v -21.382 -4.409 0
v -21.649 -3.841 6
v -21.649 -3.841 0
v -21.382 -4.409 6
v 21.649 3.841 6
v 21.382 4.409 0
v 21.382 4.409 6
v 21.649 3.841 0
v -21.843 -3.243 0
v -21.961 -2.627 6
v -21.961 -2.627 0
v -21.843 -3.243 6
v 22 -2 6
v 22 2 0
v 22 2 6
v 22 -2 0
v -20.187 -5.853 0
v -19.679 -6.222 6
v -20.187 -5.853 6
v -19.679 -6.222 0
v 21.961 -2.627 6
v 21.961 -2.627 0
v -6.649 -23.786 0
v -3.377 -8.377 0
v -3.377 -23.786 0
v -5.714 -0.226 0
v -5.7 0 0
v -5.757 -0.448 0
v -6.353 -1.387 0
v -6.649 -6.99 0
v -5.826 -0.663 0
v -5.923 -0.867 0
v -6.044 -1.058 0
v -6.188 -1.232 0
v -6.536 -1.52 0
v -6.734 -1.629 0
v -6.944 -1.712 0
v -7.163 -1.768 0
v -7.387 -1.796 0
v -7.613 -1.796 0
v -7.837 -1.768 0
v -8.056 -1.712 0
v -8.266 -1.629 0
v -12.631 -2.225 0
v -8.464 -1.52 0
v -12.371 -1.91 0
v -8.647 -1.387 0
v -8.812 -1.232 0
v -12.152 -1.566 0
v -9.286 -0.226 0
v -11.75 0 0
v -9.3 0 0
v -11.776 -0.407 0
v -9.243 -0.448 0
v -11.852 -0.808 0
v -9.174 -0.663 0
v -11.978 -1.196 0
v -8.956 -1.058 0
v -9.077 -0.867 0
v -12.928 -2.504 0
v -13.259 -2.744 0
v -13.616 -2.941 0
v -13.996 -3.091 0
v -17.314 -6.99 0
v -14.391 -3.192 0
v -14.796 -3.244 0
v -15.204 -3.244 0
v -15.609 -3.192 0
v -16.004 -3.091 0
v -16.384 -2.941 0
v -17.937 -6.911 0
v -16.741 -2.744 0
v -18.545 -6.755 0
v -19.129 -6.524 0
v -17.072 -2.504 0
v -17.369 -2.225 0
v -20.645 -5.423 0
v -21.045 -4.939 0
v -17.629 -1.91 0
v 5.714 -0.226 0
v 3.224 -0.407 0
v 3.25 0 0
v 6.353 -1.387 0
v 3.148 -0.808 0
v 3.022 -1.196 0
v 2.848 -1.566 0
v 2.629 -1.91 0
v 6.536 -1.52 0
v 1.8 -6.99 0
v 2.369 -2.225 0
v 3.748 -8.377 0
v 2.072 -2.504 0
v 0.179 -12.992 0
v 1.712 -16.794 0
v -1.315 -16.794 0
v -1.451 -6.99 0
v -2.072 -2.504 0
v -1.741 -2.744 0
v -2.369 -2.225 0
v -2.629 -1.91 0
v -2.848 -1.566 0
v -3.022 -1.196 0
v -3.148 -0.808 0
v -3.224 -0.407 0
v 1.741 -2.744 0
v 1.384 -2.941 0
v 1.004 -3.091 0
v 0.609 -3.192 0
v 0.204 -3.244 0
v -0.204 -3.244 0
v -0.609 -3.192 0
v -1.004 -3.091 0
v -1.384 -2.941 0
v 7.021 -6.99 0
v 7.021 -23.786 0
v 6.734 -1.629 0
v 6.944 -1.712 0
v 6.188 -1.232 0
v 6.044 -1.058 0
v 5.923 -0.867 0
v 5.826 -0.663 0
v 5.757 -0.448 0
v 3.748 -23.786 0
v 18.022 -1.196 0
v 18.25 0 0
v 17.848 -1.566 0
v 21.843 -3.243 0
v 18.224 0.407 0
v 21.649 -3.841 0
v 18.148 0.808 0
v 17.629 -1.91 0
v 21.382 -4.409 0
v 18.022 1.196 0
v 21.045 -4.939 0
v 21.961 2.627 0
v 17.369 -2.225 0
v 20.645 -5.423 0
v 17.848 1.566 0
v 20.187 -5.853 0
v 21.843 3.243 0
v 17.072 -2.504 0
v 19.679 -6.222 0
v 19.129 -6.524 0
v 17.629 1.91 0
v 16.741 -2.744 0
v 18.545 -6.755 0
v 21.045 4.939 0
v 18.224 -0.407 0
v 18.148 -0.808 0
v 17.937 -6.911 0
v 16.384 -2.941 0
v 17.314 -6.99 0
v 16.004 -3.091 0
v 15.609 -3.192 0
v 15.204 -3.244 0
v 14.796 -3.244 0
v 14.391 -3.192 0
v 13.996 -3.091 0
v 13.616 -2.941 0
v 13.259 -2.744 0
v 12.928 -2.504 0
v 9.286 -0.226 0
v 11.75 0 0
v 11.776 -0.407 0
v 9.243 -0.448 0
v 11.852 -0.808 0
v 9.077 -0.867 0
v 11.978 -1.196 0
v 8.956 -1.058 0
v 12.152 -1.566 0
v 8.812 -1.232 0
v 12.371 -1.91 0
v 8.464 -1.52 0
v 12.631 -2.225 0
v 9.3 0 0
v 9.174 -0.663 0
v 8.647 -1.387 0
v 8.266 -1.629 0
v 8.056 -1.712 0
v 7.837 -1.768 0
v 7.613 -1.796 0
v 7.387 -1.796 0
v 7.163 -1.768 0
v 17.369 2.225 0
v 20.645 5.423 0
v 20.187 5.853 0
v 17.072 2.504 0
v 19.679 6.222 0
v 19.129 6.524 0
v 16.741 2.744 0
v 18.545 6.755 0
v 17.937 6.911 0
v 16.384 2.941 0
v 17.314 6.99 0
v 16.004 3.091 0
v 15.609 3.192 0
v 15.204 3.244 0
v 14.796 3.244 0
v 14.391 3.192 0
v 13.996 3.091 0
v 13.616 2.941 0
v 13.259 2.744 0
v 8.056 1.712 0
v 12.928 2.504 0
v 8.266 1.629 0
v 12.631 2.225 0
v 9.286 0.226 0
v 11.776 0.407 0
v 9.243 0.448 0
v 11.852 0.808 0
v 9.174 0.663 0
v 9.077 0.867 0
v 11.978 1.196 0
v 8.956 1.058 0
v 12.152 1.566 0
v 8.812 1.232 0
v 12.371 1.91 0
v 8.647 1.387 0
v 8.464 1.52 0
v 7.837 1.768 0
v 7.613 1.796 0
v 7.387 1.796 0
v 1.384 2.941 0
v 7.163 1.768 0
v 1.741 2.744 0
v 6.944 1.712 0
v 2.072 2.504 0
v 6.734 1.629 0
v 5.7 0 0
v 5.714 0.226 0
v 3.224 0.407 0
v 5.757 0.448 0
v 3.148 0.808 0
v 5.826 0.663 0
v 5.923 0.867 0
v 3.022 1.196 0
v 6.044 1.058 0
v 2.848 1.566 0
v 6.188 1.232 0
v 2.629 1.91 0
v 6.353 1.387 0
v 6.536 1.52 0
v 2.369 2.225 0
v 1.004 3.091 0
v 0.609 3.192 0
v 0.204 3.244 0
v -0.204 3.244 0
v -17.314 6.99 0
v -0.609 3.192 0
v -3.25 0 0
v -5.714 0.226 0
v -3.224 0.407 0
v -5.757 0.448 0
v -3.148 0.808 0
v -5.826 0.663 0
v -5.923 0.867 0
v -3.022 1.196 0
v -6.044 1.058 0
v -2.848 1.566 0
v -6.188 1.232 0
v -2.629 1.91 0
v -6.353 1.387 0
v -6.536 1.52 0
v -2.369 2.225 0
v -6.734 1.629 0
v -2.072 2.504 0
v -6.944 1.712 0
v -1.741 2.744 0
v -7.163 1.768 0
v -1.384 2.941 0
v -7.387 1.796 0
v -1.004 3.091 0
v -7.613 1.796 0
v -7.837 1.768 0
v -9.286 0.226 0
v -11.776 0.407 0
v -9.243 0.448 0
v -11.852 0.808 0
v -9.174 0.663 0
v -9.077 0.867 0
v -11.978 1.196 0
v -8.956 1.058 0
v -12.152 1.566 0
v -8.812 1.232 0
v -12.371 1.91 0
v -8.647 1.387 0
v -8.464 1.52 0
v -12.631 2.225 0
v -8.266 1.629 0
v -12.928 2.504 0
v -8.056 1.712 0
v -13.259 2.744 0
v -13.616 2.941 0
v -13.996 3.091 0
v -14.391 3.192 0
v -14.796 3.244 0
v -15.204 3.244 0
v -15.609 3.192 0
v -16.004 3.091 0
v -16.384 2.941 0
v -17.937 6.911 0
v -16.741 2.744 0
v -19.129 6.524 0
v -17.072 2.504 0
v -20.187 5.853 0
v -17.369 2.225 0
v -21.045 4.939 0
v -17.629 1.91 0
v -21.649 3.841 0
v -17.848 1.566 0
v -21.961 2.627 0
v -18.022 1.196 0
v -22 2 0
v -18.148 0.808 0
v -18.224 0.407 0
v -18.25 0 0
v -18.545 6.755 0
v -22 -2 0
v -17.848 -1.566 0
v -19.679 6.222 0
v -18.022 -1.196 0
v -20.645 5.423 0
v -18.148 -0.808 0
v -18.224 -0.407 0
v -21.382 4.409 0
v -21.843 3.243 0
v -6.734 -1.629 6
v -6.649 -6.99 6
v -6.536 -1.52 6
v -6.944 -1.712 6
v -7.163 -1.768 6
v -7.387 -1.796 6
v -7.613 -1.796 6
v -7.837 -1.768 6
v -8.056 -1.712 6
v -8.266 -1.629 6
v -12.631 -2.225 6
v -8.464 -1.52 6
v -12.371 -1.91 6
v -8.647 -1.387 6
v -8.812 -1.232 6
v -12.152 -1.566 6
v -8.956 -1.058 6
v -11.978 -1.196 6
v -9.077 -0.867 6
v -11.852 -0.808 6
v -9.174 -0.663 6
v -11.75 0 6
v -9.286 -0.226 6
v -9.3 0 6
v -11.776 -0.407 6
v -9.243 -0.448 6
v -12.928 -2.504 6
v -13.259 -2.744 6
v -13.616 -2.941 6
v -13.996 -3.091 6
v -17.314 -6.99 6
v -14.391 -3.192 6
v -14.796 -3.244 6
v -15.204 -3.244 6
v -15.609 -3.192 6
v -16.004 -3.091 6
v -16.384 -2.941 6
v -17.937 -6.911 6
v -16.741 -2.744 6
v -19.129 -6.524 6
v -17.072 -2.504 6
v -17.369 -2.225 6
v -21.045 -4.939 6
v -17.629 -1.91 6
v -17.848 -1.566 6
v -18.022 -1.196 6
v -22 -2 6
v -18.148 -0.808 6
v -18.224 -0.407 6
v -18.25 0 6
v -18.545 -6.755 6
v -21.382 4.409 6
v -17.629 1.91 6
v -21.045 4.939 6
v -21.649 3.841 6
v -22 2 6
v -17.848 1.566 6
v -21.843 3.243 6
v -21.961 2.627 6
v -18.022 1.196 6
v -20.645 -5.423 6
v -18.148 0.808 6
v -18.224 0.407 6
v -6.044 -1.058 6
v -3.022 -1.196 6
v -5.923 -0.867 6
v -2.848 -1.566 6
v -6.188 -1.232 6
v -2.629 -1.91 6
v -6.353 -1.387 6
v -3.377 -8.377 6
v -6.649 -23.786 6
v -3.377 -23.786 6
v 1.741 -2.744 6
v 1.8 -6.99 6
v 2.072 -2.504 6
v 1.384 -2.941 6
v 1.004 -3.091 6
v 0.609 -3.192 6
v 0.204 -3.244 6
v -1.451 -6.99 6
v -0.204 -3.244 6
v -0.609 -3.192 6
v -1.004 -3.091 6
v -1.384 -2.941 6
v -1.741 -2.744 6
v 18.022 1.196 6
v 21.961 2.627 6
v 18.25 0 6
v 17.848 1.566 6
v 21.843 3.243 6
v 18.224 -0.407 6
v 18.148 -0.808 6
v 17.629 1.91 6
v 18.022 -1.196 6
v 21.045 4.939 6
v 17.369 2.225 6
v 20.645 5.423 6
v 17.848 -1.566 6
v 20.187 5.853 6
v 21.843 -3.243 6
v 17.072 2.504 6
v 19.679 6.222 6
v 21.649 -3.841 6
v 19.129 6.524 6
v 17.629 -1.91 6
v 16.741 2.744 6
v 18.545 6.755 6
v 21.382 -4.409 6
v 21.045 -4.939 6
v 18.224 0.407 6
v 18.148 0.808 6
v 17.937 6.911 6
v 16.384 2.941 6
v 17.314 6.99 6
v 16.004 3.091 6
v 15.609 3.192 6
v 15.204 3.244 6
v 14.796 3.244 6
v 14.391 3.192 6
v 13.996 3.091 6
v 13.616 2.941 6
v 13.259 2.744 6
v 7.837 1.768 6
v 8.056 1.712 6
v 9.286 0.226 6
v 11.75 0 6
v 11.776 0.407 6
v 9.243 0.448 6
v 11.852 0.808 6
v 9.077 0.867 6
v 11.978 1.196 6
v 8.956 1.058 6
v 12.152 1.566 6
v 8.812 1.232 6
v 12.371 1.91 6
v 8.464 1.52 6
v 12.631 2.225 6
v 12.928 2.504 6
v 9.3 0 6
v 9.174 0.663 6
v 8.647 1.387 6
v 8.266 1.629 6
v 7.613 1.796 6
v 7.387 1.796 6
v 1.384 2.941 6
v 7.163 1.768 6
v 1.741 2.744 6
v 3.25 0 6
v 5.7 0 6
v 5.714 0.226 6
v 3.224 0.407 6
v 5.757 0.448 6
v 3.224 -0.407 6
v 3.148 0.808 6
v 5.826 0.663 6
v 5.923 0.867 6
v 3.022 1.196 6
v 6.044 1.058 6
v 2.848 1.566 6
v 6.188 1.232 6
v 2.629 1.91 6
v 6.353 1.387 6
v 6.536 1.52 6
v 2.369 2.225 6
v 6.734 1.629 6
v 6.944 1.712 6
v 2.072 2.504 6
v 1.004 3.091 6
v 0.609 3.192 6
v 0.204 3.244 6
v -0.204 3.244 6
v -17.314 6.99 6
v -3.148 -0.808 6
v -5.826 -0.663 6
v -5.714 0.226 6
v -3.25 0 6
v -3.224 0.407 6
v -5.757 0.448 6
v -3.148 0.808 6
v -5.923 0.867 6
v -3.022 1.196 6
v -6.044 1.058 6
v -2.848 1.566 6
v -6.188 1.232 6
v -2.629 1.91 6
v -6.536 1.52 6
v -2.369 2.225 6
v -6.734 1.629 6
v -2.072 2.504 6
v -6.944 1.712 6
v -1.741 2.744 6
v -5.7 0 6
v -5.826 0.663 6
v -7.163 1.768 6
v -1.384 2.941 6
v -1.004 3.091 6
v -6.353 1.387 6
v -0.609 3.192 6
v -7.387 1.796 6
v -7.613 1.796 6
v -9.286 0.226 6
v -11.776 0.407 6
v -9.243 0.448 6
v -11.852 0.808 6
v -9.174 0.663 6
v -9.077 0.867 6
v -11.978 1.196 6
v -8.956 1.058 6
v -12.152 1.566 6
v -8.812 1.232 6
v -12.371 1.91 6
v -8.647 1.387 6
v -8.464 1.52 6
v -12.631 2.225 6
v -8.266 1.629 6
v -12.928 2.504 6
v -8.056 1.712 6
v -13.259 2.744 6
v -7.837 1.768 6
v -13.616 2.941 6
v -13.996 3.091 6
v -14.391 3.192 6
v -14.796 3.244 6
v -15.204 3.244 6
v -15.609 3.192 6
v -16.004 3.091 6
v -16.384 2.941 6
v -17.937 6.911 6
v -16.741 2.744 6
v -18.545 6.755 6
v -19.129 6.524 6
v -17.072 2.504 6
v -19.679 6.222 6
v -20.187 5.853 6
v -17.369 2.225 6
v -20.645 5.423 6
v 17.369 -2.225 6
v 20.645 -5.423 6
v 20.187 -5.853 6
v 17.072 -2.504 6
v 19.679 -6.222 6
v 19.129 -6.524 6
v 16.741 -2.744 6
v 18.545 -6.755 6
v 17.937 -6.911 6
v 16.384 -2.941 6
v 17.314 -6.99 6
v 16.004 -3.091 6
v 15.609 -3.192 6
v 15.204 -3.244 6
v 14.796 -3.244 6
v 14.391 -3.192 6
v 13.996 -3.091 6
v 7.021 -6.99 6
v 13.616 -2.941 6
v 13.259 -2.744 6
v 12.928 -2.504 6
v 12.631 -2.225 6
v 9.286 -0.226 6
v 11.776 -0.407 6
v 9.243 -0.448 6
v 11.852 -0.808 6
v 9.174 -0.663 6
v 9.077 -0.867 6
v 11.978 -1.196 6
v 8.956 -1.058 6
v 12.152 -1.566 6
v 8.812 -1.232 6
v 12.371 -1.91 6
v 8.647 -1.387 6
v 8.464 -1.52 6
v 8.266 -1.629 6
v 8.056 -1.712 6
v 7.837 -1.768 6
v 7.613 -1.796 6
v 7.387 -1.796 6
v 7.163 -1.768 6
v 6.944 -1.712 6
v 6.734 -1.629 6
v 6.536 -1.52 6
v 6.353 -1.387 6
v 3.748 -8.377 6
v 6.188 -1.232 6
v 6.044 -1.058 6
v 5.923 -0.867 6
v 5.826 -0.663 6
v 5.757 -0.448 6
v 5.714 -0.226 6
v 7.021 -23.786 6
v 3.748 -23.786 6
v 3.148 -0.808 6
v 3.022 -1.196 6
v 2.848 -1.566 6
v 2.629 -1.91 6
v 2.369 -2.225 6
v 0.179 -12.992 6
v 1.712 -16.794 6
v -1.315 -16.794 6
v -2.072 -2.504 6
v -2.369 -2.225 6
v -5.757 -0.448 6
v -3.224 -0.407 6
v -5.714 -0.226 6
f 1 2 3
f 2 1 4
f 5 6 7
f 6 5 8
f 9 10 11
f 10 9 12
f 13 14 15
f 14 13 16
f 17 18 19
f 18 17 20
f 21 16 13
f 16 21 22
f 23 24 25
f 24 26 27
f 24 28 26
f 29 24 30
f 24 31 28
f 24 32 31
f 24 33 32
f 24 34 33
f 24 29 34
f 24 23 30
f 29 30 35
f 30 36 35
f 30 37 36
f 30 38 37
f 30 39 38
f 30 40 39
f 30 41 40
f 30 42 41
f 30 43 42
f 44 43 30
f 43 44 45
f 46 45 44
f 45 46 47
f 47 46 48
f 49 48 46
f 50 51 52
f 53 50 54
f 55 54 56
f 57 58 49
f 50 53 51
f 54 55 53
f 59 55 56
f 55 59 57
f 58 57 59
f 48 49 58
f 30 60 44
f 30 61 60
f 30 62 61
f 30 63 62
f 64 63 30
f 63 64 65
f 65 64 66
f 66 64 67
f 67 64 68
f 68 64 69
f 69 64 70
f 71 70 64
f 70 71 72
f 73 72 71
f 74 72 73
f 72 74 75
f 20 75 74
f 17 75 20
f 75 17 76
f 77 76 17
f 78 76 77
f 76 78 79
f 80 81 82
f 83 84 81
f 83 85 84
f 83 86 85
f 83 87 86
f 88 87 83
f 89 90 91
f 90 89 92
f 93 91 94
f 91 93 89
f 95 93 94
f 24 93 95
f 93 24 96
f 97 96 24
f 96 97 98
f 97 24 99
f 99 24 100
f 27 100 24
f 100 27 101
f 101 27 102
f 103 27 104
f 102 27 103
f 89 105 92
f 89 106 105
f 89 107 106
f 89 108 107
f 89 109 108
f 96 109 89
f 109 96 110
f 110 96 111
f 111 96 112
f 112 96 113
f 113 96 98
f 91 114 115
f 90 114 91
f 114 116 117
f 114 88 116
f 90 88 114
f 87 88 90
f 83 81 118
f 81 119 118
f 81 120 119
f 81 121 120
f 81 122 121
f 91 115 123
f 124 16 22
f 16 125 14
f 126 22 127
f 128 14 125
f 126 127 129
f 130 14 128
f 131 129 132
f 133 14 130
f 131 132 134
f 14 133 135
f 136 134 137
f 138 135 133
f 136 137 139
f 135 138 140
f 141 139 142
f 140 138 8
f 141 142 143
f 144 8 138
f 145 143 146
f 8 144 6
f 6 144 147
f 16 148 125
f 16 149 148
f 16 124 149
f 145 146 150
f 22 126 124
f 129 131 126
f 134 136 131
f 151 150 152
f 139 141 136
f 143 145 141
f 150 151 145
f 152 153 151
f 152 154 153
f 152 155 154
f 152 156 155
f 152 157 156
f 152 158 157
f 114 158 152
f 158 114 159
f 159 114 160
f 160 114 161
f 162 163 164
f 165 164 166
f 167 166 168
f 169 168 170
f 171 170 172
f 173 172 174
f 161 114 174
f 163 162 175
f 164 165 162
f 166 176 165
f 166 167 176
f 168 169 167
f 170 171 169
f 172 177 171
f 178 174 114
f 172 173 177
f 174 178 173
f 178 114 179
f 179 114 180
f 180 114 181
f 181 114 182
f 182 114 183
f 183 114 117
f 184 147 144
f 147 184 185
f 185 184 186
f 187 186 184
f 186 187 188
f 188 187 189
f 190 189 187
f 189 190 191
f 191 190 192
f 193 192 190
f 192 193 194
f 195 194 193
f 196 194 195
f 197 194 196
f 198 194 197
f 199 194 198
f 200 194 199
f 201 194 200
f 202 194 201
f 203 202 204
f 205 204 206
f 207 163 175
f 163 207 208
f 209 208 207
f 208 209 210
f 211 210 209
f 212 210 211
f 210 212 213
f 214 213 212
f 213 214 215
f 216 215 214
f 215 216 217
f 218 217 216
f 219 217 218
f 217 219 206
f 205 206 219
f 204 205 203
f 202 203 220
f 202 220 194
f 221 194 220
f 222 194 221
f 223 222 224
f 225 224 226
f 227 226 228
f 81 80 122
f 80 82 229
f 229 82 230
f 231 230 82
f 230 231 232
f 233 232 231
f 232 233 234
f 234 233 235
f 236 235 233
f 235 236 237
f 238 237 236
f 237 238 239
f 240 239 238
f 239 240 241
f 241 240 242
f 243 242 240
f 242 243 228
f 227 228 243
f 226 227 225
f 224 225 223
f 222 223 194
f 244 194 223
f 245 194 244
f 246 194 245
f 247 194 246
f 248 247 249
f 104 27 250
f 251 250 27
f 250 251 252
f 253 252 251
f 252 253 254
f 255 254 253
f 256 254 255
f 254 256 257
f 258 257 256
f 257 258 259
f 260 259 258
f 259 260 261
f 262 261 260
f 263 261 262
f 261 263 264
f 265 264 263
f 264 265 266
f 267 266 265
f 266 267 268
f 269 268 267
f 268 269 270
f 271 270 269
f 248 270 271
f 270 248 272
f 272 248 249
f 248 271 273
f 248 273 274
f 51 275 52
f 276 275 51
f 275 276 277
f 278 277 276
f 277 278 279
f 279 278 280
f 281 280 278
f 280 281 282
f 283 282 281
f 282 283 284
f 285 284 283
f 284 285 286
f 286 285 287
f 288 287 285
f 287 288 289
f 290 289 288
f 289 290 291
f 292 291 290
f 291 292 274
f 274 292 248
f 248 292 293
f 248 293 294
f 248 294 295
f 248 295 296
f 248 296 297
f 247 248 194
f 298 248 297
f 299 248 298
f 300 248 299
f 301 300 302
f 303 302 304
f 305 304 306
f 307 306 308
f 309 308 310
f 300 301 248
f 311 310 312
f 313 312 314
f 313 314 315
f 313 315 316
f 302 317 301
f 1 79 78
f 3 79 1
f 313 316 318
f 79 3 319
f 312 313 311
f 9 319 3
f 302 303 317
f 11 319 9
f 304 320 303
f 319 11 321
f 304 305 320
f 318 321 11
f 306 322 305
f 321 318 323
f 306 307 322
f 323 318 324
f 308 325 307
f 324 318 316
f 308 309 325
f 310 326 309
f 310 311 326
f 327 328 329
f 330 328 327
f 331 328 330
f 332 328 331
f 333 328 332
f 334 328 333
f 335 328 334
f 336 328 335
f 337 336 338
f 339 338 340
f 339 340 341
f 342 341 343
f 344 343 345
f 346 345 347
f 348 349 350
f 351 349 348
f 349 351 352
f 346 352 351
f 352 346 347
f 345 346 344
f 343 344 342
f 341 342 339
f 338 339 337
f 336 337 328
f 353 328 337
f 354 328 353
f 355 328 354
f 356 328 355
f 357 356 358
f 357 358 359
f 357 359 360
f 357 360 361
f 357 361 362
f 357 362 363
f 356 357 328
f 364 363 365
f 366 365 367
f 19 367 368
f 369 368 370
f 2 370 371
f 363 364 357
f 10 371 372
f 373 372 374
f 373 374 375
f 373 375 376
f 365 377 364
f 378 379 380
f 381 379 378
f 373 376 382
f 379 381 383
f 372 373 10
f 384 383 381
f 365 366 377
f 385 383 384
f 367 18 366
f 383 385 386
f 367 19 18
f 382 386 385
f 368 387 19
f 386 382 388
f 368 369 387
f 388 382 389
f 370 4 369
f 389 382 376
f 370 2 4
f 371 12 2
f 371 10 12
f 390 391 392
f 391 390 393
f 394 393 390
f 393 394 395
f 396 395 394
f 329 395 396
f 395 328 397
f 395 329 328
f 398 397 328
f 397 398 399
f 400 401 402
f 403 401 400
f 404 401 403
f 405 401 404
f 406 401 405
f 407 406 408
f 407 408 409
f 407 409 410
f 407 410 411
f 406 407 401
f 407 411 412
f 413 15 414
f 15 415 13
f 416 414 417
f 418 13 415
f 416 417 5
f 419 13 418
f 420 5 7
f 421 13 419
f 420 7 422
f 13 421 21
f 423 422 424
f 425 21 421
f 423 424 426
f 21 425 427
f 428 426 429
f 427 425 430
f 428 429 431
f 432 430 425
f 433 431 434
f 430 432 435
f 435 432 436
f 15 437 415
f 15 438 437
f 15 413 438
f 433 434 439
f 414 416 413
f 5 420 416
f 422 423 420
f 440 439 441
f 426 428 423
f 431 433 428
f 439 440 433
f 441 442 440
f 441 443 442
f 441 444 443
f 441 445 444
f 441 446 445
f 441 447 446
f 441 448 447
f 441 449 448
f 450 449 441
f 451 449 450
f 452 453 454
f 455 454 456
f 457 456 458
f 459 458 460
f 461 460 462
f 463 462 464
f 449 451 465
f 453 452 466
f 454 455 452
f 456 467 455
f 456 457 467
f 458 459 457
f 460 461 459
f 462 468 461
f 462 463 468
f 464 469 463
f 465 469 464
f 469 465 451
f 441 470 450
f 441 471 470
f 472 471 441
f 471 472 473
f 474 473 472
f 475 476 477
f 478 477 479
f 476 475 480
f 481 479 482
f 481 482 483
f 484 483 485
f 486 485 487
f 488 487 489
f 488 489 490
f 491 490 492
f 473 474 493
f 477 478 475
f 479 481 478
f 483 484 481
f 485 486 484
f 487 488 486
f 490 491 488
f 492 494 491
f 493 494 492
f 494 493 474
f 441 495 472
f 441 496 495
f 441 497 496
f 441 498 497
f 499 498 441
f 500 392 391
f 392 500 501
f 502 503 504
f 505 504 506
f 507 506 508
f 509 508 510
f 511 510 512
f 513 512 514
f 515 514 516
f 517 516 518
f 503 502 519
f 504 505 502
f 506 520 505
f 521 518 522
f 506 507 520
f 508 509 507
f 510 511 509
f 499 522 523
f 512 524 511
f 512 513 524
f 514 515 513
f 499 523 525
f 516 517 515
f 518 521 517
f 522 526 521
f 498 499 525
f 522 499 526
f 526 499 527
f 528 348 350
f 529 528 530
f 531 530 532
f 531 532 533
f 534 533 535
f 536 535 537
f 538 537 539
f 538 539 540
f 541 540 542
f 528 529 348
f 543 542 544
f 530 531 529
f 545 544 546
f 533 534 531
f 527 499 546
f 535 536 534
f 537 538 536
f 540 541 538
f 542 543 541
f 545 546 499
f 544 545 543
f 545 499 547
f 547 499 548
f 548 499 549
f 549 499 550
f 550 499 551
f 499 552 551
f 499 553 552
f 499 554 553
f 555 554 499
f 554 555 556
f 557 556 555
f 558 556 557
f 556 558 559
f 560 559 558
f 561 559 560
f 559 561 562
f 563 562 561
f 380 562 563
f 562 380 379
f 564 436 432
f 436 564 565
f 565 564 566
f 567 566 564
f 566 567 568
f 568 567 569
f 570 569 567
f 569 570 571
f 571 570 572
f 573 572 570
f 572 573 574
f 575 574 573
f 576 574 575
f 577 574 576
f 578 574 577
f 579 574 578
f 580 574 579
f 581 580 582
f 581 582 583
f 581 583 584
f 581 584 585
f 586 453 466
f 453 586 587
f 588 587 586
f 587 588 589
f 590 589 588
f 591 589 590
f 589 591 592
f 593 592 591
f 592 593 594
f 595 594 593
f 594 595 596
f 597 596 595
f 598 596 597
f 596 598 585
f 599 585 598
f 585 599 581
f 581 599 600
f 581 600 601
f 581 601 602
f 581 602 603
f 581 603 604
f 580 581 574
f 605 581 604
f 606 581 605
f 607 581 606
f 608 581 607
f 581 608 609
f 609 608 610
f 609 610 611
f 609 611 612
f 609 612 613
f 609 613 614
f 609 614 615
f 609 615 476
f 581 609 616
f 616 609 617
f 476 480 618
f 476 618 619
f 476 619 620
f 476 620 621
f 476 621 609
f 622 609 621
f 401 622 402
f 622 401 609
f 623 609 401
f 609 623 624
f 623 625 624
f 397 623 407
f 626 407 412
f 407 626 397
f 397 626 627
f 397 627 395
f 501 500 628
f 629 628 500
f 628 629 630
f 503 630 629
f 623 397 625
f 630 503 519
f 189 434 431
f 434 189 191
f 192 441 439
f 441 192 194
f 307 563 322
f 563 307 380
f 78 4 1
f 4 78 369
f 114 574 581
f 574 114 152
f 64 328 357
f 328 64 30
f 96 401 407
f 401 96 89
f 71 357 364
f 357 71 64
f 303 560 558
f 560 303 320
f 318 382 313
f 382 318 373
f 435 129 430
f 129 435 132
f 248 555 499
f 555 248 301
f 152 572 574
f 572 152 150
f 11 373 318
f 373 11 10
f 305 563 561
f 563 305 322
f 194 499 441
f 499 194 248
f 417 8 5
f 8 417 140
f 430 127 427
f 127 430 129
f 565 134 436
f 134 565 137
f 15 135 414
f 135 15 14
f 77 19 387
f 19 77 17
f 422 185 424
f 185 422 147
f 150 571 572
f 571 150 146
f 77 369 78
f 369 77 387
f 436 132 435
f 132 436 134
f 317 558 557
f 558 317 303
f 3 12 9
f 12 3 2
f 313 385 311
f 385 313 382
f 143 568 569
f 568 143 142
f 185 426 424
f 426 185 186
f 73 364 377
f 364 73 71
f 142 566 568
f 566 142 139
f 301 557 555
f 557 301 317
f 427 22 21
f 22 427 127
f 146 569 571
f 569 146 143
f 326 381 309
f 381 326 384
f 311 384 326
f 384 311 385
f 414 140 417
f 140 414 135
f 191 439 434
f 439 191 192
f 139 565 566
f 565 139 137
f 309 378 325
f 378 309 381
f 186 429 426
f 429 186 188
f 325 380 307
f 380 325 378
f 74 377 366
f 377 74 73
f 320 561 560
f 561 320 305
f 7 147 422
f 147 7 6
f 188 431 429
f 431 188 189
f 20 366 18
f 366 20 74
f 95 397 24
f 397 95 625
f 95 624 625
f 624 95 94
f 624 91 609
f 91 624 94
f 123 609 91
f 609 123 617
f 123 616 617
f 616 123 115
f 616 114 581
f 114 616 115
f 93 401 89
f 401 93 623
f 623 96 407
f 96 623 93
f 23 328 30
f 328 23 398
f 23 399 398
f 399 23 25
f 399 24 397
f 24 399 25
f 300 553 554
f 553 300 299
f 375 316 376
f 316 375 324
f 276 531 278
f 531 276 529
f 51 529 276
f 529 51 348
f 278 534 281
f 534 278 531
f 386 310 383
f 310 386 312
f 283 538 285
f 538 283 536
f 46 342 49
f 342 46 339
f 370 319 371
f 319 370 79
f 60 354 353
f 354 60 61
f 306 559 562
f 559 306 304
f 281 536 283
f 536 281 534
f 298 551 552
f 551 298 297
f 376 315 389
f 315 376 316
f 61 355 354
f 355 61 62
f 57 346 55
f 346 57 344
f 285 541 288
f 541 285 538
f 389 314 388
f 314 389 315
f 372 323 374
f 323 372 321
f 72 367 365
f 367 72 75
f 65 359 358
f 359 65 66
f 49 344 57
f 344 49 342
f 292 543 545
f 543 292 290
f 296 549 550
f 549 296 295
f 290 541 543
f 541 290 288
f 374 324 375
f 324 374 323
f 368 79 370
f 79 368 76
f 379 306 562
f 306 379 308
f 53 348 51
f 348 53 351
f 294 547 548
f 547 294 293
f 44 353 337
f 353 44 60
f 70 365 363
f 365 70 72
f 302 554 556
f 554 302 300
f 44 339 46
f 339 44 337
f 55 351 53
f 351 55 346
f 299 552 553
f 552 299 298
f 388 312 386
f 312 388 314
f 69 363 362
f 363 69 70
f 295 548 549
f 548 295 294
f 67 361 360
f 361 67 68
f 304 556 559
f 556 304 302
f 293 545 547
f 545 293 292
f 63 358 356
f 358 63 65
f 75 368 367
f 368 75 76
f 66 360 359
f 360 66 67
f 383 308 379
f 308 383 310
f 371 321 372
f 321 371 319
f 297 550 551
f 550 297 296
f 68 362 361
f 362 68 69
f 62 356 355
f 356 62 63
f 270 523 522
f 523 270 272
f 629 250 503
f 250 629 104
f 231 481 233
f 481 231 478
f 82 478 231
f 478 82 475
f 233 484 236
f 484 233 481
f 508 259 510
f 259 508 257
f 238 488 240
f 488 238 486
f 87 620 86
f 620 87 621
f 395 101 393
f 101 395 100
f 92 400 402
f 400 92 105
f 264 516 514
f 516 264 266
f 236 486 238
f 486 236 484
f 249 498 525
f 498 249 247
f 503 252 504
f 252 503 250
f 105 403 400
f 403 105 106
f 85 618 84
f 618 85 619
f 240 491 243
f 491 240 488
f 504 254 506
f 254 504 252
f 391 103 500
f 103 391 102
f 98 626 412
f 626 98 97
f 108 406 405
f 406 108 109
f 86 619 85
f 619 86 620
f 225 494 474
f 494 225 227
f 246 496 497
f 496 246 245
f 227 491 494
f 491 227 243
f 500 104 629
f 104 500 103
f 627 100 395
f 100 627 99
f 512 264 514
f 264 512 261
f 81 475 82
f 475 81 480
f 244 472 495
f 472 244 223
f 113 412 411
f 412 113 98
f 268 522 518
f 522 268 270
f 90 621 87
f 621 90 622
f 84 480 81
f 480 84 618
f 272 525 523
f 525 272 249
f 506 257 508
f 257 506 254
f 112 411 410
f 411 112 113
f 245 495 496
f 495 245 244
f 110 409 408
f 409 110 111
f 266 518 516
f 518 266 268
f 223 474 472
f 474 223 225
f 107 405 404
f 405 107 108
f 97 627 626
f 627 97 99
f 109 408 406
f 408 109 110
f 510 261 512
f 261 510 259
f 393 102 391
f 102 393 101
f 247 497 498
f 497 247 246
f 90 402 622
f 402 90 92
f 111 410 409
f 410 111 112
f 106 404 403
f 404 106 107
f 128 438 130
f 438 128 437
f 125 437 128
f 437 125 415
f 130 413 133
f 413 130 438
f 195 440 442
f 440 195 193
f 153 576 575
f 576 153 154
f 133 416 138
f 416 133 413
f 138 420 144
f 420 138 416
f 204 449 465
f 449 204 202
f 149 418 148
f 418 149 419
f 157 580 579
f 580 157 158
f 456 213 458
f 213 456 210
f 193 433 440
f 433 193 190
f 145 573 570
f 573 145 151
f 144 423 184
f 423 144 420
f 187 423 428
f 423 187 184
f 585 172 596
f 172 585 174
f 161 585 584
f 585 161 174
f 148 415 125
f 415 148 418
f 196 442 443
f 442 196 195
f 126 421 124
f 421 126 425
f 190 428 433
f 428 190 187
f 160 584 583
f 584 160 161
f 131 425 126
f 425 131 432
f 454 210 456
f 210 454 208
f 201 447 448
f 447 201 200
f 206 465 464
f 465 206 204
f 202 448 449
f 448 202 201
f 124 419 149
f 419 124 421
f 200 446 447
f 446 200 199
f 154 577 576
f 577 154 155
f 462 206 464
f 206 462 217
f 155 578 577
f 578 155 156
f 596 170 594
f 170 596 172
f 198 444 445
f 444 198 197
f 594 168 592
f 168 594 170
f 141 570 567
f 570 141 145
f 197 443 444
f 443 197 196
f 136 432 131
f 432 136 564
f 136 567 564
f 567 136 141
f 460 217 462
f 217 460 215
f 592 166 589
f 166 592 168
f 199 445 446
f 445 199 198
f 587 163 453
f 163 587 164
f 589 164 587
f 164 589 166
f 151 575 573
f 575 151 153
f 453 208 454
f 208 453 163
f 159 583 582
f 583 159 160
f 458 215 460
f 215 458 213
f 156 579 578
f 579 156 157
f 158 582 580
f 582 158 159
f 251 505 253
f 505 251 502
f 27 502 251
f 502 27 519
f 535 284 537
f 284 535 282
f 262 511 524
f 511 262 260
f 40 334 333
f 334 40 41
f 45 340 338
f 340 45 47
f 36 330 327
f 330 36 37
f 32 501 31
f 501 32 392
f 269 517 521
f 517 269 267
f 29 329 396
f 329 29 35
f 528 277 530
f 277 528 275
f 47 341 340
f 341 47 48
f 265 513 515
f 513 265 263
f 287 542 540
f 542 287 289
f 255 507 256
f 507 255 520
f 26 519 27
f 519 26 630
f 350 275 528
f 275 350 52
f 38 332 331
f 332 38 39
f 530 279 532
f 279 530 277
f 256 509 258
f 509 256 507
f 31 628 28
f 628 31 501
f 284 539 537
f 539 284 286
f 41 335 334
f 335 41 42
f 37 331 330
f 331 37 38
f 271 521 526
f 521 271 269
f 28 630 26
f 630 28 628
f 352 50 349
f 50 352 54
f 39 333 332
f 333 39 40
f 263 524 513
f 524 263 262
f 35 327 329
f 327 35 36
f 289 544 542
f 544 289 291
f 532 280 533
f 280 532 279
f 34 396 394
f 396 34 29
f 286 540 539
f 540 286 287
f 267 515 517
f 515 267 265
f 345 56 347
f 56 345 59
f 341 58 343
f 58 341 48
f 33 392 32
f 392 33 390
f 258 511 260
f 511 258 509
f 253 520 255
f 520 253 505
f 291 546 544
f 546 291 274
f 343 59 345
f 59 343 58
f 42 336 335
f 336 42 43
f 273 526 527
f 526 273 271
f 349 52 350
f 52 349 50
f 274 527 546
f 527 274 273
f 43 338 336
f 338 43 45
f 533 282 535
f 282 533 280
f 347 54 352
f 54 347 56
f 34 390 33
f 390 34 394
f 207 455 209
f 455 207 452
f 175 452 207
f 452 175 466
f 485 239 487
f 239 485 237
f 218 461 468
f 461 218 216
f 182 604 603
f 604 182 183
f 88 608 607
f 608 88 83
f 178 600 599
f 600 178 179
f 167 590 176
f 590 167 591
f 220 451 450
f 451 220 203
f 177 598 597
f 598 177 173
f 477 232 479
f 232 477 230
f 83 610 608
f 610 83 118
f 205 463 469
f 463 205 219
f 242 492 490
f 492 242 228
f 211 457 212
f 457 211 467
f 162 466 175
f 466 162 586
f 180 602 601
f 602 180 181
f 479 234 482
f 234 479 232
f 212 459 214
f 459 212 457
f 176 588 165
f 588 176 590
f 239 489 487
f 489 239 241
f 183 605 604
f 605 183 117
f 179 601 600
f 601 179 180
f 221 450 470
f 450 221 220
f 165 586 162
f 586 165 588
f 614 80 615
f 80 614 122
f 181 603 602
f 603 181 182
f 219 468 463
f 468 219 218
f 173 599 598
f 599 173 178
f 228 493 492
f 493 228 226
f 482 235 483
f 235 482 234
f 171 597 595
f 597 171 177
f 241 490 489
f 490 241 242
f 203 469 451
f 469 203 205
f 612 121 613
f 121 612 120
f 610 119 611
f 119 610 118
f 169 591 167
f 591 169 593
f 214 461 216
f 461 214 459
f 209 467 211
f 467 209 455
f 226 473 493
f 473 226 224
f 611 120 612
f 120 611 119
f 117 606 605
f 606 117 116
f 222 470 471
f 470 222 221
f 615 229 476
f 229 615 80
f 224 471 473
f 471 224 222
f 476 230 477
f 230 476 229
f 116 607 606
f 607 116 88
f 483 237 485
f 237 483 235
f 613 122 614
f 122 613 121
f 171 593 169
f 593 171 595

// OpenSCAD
$fn = 50;


difference() {
	union() {
		hull() {
			translate(v = [-17.0000000000, 2.0000000000, 0]) {
				cylinder(h = 6, r = 5);
			}
			translate(v = [17.0000000000, 2.0000000000, 0]) {
				cylinder(h = 6, r = 5);
			}
			translate(v = [-17.0000000000, -2.0000000000, 0]) {
				cylinder(h = 6, r = 5);
			}
			translate(v = [17.0000000000, -2.0000000000, 0]) {
				cylinder(h = 6, r = 5);
			}
		}
		translate(v = [0, -5, 0]) {
			linear_extrude(height = 6) {
				text(font = "DejaVu Sans Mono:style=Bold", halign = "center", size = 19.0000000000, text = "M", valign = "top");
			}
		}
	}
	union() {
		translate(v = [-15.0000000000, 0.0000000000, 0]) {
			translate(v = [0, 0, -100]) {
				cylinder(h = 200, r = 3.2500000000);
			}
		}
		translate(v = [0, 0, -100]) {
			cylinder(h = 200, r = 3.2500000000);
		}
		translate(v = [15.0000000000, 0.0000000000, 0]) {
			translate(v = [0, 0, -100]) {
				cylinder(h = 200, r = 3.2500000000);
			}
		}
		translate(v = [-15.0000000000, 0.0000000000, 0]) {
			translate(v = [0, 0, -100]) {
				cylinder(h = 200, r = 1.8000000000);
			}
		}
		translate(v = [-7.5000000000, 0.0000000000, 0]) {
			translate(v = [0, 0, -100]) {
				cylinder(h = 200, r = 1.8000000000);
			}
		}
		translate(v = [0, 0, -100]) {
			cylinder(h = 200, r = 1.8000000000);
		}
		translate(v = [7.5000000000, 0.0000000000, 0]) {
			translate(v = [0, 0, -100]) {
				cylinder(h = 200, r = 1.8000000000);
			}
		}
		translate(v = [15.0000000000, 0.0000000000, 0]) {
			translate(v = [0, 0, -100]) {
				cylinder(h = 200, r = 1.8000000000);
			}
		}
	}
}
